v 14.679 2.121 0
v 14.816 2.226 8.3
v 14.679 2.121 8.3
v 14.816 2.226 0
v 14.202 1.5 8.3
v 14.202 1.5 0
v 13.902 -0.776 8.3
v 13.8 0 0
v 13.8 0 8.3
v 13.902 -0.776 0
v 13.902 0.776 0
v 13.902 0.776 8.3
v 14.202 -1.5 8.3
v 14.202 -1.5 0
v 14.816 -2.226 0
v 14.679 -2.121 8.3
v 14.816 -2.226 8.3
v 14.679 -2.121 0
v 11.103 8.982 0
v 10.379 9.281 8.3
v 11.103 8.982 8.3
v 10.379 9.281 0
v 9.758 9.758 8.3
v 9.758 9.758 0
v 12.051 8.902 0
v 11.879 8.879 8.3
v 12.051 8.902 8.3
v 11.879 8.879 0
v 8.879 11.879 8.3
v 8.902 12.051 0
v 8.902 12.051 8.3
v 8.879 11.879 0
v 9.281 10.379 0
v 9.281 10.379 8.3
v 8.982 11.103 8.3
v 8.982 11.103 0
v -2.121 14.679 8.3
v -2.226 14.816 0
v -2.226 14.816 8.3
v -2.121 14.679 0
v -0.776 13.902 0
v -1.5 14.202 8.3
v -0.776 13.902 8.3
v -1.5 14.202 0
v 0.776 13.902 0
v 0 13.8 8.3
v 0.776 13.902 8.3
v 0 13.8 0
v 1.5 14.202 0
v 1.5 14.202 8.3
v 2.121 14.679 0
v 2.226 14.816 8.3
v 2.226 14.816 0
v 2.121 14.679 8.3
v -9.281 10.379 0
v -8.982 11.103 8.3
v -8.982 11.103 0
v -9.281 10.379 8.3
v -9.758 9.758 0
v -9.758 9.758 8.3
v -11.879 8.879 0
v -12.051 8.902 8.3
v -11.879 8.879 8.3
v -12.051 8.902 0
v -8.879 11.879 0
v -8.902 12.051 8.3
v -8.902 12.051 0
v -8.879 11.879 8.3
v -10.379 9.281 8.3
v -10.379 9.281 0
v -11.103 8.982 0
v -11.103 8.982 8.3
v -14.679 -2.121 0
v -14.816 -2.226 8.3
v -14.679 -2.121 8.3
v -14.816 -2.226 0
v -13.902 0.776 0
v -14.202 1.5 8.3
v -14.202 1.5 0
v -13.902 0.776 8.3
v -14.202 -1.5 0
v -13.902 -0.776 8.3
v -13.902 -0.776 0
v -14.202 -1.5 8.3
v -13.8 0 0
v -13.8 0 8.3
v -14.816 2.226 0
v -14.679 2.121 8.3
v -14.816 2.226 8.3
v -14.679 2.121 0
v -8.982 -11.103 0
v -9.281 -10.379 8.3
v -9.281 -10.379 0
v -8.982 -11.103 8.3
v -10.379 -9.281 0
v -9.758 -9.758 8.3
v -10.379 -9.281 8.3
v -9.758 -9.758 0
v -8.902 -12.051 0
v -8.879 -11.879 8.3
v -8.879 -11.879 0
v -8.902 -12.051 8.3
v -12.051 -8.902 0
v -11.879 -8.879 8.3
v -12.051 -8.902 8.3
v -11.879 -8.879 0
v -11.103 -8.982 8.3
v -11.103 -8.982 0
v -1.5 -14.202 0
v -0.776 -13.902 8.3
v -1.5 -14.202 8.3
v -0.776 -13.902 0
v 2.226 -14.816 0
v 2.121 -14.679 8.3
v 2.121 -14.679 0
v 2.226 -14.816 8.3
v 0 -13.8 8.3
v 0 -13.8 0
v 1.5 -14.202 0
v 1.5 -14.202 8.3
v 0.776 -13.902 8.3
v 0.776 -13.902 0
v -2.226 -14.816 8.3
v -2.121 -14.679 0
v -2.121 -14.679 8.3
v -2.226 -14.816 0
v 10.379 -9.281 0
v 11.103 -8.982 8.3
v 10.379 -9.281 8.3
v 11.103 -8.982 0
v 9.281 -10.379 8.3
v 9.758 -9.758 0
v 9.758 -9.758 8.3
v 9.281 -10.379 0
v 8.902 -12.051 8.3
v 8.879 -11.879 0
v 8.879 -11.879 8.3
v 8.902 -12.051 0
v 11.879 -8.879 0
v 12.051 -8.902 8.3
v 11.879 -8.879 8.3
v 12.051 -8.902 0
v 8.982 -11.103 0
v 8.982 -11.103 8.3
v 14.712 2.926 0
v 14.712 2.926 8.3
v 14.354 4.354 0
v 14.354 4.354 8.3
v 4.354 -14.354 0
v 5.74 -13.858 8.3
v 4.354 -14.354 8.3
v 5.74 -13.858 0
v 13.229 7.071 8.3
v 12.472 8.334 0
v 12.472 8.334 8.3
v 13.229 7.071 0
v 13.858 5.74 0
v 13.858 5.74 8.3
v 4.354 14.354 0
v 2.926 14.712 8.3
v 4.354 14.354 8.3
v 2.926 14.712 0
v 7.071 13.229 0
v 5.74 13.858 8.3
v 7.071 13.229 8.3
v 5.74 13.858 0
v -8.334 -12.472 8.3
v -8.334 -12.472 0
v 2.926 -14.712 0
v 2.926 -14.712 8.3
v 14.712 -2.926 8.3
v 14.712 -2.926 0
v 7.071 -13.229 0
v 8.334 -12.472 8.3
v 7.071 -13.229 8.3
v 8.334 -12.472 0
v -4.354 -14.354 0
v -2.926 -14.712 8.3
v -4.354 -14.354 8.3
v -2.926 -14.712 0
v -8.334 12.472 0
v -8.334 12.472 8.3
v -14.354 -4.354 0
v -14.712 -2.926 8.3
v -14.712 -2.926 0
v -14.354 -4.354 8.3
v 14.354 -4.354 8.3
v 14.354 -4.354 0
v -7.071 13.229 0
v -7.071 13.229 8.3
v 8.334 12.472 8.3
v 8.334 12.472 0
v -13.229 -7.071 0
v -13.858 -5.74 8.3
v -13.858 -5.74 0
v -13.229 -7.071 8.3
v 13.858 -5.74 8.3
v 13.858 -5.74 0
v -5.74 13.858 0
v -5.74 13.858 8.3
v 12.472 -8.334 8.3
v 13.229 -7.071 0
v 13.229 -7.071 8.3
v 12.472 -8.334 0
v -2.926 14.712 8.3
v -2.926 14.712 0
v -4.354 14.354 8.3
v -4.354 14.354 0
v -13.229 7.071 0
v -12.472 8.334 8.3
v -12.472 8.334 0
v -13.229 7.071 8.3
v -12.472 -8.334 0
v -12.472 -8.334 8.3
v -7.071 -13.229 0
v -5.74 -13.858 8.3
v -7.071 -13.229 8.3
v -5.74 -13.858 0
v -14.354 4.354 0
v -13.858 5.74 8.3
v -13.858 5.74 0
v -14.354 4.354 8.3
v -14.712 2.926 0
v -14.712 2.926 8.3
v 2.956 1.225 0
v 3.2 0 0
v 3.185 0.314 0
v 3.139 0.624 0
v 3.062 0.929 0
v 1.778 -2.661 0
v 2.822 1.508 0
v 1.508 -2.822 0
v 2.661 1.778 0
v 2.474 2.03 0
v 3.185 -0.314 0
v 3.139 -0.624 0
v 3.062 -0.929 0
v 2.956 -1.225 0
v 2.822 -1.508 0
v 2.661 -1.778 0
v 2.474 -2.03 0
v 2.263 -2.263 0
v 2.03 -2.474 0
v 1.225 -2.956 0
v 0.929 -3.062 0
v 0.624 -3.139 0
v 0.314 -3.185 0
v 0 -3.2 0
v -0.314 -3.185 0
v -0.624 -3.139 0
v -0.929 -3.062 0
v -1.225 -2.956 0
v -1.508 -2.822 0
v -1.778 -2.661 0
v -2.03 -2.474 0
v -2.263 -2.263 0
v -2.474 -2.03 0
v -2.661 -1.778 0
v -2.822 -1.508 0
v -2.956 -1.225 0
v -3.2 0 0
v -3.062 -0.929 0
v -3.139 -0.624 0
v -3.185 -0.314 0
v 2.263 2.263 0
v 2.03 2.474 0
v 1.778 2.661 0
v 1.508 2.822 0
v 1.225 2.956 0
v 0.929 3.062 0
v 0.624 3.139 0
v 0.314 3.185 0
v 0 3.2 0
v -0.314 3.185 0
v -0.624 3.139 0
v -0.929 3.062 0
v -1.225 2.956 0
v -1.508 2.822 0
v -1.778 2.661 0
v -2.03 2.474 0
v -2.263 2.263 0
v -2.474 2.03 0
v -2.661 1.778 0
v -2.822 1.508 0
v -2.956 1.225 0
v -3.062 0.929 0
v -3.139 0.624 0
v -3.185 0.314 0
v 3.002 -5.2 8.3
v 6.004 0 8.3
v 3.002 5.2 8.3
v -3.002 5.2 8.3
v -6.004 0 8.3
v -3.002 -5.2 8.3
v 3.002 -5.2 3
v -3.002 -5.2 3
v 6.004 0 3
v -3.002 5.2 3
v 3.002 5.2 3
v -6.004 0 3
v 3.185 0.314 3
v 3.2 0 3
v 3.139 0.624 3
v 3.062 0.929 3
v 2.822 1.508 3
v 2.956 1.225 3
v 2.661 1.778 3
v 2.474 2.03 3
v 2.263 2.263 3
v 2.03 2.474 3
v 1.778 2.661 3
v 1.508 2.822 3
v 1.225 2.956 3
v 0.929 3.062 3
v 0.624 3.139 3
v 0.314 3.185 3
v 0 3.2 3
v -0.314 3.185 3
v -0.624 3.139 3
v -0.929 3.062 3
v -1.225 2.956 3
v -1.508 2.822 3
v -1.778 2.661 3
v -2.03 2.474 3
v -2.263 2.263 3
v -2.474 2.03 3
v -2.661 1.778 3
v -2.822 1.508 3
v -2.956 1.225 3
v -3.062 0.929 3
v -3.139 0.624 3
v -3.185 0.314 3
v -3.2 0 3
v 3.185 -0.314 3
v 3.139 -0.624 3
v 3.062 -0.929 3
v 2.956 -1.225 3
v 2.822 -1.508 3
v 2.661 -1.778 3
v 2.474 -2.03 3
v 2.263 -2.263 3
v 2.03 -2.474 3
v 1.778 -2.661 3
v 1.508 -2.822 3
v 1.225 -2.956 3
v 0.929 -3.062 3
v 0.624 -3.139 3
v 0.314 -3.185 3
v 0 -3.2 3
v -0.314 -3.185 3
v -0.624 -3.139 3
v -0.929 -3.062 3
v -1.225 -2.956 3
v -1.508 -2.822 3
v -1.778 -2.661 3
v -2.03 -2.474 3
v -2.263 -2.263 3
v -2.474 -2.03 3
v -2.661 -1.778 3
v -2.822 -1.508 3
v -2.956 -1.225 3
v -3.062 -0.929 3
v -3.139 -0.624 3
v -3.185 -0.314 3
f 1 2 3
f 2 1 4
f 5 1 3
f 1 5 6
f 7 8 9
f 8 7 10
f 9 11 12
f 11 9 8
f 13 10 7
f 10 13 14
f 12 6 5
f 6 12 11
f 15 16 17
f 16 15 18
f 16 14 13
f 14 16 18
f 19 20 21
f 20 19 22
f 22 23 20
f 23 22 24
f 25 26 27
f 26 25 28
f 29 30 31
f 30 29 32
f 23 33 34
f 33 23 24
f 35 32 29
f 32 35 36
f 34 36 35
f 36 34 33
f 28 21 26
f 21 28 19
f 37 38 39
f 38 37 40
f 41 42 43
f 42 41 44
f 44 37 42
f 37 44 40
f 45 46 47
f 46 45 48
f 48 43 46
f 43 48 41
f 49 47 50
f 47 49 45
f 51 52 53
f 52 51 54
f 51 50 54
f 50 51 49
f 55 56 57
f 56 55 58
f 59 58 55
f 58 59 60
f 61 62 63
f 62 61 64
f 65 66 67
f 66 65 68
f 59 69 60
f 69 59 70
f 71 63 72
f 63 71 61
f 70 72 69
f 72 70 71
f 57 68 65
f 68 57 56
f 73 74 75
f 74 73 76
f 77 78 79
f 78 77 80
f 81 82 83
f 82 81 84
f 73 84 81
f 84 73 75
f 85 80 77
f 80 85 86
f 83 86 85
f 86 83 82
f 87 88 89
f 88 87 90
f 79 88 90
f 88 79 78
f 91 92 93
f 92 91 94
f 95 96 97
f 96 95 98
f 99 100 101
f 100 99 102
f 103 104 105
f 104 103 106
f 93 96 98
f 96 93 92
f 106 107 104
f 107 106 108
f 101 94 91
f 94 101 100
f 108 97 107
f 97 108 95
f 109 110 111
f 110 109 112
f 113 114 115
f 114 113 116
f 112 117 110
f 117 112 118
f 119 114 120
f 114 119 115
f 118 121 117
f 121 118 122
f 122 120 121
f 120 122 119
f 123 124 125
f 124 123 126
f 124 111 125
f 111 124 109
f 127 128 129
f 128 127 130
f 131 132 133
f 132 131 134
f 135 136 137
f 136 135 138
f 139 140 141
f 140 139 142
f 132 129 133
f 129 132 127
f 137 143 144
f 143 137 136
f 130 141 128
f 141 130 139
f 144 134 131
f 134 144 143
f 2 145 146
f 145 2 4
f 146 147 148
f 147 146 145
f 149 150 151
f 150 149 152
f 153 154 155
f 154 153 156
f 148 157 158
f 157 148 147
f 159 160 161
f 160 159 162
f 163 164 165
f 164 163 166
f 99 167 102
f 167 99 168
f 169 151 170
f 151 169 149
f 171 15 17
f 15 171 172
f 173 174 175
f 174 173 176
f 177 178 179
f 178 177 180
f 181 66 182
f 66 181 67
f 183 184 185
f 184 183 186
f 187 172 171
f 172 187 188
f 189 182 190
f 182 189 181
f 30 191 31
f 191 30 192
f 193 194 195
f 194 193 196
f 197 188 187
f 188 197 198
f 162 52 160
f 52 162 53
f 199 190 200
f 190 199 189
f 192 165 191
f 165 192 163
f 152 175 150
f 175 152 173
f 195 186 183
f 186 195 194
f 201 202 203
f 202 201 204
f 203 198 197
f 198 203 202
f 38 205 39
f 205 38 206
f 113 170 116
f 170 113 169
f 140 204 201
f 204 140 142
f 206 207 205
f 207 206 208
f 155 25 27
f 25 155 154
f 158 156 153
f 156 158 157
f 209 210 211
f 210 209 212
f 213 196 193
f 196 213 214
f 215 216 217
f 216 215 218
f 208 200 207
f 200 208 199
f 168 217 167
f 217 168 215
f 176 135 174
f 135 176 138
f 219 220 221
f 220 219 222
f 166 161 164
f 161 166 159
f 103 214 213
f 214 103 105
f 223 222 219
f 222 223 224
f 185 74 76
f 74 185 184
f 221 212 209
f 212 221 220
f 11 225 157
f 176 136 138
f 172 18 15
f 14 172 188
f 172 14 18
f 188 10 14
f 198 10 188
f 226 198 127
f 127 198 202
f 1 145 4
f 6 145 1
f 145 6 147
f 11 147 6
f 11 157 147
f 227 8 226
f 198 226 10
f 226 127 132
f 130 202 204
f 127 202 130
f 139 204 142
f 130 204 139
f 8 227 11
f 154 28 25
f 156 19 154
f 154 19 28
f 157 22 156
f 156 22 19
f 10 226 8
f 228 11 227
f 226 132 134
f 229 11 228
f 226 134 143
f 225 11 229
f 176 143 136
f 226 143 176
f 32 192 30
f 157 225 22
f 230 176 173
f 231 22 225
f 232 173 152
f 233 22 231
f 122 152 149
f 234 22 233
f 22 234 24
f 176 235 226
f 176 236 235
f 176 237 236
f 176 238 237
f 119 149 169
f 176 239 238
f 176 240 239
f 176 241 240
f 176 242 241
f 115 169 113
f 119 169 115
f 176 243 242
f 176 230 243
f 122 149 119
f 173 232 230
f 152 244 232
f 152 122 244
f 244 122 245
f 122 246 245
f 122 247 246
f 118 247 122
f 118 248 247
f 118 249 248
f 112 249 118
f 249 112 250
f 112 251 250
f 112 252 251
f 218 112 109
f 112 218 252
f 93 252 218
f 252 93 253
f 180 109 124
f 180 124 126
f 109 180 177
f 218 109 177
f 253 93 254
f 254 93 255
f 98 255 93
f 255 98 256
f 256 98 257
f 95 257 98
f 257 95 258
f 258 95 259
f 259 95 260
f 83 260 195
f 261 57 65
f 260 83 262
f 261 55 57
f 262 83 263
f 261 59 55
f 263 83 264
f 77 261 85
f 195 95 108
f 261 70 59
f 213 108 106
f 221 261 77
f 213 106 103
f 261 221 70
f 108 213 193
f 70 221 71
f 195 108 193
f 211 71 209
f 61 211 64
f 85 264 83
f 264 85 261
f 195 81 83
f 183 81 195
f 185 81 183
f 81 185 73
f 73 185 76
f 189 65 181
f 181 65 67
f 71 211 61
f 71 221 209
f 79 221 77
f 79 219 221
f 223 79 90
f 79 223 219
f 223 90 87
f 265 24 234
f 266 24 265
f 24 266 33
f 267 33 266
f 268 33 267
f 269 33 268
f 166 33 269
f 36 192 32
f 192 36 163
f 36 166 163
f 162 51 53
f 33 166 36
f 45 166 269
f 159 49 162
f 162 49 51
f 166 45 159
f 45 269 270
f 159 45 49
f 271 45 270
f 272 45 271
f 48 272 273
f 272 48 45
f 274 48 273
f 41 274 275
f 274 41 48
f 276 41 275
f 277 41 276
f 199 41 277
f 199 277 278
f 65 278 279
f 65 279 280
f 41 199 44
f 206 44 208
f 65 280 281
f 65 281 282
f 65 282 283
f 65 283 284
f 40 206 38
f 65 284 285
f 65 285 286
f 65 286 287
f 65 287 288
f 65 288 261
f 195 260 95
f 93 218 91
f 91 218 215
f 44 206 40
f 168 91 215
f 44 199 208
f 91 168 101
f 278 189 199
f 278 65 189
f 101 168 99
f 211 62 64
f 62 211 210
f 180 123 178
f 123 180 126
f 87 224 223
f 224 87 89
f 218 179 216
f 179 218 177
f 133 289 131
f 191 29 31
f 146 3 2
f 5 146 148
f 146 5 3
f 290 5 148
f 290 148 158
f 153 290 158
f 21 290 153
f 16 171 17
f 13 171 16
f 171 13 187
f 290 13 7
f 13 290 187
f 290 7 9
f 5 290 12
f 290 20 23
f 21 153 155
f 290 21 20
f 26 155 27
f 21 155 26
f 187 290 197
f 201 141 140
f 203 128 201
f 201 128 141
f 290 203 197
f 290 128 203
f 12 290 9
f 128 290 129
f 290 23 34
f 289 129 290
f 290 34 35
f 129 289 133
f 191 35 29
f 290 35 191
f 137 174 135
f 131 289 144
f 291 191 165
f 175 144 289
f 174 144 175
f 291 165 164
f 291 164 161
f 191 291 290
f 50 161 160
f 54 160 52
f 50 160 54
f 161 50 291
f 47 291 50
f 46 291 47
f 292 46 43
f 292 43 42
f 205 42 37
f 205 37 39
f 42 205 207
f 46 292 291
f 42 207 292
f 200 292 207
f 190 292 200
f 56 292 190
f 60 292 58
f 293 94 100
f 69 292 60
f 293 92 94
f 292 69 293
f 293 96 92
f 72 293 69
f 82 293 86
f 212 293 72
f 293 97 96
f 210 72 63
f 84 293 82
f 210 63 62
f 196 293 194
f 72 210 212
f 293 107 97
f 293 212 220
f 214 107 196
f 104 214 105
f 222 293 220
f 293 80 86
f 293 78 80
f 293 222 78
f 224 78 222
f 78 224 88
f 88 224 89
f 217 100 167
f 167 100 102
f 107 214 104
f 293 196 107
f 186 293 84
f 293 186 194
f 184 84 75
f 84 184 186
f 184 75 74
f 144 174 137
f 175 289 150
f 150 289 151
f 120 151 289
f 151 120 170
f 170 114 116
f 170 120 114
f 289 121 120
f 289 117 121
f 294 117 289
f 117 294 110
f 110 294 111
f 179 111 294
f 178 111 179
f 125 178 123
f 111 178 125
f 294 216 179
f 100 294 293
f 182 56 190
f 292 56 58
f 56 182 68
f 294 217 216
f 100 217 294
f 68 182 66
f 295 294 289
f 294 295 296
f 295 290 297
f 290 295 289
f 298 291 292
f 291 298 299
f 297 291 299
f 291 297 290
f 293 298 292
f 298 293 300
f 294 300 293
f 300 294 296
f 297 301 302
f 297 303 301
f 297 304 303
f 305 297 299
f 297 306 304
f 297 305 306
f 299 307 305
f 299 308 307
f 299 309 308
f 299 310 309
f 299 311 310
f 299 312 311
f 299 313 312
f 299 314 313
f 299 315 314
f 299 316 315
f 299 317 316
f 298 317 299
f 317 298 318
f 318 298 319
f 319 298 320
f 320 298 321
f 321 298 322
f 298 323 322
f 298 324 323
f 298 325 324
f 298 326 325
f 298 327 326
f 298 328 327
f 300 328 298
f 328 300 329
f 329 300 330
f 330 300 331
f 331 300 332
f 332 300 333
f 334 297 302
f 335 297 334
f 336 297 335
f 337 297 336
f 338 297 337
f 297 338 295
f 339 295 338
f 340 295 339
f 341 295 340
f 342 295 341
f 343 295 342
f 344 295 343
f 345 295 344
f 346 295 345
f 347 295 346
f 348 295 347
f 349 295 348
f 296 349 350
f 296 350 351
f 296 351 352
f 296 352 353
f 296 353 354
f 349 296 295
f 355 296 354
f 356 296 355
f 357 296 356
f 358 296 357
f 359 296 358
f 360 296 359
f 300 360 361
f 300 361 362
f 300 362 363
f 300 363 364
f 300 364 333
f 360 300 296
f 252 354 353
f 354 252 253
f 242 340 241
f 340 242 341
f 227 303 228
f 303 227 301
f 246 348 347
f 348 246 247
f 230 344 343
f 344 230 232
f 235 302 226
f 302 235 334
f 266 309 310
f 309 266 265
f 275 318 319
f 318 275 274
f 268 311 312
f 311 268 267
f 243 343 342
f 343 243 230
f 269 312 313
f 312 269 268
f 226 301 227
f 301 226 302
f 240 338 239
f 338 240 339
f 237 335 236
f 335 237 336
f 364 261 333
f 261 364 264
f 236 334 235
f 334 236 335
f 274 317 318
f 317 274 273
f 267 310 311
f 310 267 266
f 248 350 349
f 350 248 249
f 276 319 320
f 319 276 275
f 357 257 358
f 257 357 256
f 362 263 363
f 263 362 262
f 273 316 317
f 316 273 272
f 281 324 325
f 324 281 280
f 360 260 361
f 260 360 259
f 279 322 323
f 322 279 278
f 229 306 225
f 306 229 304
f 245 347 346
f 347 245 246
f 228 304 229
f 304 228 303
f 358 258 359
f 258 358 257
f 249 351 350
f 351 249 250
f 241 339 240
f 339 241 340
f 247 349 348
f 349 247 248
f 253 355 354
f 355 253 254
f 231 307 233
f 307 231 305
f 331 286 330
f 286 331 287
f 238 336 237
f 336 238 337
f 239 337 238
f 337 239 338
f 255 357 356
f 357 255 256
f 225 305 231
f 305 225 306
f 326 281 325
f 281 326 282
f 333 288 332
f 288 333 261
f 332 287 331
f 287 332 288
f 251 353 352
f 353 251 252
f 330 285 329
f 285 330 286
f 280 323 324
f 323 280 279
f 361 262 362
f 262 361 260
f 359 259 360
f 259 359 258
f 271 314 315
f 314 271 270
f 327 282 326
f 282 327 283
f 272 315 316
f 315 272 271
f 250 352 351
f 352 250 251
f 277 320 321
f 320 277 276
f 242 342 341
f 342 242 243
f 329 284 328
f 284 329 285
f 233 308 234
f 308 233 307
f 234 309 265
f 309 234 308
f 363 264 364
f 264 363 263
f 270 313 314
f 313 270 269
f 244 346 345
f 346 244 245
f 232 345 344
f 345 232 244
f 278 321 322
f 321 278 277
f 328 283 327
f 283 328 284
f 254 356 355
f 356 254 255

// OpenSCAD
// Hand knob for a real DIN 934 hex nut; print flat, hex pocket facing up.
// Drop in a metal nut after printing and retain with a dab of glue.
// These are DIN 934 heights; ISO 4032 M5/M6/M8 nuts can be taller.
// The nut supplies the durable thread; the pocket prevents it from turning.
size = 6; // Metal nut size [3:M3,4:M4,5:M5,6:M6,8:M8]
knob_diameter = 30; // Grip diameter, mm [24:2:44]
base_thickness = 3; // Solid material below the hex pocket, mm [2:0.5:5]
pocket_clearance = 0.2; // Clearance at EACH hex flat, mm [0.15:0.05:0.3]
hole_clearance = 0.4; // Added to nominal screw DIAMETER, mm [0.3:0.1:0.6]
grip_count = 8; // Number of finger scallops [6:1:12]
grip_depth = 1.2; // Scallop intrusion into the rim, mm [0.6:0.2:2]
nut_recess = 0.3; // Nut top below the knob face, mm [0.2:0.1:0.6]

// DIN 934 dimensions (across flats, thickness), mm:
// https://www.westfieldfasteners.co.uk/Standards/Nut_Hex_M.html
// M3: 5.5,2.4; M4: 7,3.2; M5: 8,4; M6: 10,5; M8: 13,6.5.
/* [Hidden] */
sizes = [3,4,5,6,8];
flats = [5.5,7,8,10,13];
heights = [2.4,3.2,4,5,6.5];
indices = [for (i=[0:4]) if (sizes[i]==size) i];
assert(len(indices)==1,"Choose M3, M4, M5, M6 or M8");
index = indices[0];
pocket_flats = flats[index]+2*pocket_clearance;
pocket_corners = pocket_flats/cos(30);
height = base_thickness+heights[index]+nut_recess;
scallop_radius = 3;
eps = 0.02;
$fn = 64;
assert(base_thickness >= 1.2,"Keep at least 1.2 mm beneath the nut");
assert(pocket_clearance > 0 && hole_clearance > 0,"Clearances must be positive");
assert(size+hole_clearance < flats[index],"Keep a seating ledge under the nut");
assert(knob_diameter/2-grip_depth-pocket_corners/2 >= 2,"Leave 2 mm outside the hex corners");

module hand_knob() {
    difference() {
        cylinder(h=height,d=knob_diameter);
        translate([0,0,base_thickness])
            cylinder(h=height,d=pocket_corners,$fn=6);
        translate([0,0,-eps])
            cylinder(h=height+2*eps,d=size+hole_clearance);
        for (i=[0:grip_count-1]) rotate([0,0,i*360/grip_count])
            translate([knob_diameter/2+scallop_radius-grip_depth,0,-eps])
                cylinder(h=height+2*eps,r=scallop_radius,$fn=24);
    }
}

color("#e4665f") hand_knob();
